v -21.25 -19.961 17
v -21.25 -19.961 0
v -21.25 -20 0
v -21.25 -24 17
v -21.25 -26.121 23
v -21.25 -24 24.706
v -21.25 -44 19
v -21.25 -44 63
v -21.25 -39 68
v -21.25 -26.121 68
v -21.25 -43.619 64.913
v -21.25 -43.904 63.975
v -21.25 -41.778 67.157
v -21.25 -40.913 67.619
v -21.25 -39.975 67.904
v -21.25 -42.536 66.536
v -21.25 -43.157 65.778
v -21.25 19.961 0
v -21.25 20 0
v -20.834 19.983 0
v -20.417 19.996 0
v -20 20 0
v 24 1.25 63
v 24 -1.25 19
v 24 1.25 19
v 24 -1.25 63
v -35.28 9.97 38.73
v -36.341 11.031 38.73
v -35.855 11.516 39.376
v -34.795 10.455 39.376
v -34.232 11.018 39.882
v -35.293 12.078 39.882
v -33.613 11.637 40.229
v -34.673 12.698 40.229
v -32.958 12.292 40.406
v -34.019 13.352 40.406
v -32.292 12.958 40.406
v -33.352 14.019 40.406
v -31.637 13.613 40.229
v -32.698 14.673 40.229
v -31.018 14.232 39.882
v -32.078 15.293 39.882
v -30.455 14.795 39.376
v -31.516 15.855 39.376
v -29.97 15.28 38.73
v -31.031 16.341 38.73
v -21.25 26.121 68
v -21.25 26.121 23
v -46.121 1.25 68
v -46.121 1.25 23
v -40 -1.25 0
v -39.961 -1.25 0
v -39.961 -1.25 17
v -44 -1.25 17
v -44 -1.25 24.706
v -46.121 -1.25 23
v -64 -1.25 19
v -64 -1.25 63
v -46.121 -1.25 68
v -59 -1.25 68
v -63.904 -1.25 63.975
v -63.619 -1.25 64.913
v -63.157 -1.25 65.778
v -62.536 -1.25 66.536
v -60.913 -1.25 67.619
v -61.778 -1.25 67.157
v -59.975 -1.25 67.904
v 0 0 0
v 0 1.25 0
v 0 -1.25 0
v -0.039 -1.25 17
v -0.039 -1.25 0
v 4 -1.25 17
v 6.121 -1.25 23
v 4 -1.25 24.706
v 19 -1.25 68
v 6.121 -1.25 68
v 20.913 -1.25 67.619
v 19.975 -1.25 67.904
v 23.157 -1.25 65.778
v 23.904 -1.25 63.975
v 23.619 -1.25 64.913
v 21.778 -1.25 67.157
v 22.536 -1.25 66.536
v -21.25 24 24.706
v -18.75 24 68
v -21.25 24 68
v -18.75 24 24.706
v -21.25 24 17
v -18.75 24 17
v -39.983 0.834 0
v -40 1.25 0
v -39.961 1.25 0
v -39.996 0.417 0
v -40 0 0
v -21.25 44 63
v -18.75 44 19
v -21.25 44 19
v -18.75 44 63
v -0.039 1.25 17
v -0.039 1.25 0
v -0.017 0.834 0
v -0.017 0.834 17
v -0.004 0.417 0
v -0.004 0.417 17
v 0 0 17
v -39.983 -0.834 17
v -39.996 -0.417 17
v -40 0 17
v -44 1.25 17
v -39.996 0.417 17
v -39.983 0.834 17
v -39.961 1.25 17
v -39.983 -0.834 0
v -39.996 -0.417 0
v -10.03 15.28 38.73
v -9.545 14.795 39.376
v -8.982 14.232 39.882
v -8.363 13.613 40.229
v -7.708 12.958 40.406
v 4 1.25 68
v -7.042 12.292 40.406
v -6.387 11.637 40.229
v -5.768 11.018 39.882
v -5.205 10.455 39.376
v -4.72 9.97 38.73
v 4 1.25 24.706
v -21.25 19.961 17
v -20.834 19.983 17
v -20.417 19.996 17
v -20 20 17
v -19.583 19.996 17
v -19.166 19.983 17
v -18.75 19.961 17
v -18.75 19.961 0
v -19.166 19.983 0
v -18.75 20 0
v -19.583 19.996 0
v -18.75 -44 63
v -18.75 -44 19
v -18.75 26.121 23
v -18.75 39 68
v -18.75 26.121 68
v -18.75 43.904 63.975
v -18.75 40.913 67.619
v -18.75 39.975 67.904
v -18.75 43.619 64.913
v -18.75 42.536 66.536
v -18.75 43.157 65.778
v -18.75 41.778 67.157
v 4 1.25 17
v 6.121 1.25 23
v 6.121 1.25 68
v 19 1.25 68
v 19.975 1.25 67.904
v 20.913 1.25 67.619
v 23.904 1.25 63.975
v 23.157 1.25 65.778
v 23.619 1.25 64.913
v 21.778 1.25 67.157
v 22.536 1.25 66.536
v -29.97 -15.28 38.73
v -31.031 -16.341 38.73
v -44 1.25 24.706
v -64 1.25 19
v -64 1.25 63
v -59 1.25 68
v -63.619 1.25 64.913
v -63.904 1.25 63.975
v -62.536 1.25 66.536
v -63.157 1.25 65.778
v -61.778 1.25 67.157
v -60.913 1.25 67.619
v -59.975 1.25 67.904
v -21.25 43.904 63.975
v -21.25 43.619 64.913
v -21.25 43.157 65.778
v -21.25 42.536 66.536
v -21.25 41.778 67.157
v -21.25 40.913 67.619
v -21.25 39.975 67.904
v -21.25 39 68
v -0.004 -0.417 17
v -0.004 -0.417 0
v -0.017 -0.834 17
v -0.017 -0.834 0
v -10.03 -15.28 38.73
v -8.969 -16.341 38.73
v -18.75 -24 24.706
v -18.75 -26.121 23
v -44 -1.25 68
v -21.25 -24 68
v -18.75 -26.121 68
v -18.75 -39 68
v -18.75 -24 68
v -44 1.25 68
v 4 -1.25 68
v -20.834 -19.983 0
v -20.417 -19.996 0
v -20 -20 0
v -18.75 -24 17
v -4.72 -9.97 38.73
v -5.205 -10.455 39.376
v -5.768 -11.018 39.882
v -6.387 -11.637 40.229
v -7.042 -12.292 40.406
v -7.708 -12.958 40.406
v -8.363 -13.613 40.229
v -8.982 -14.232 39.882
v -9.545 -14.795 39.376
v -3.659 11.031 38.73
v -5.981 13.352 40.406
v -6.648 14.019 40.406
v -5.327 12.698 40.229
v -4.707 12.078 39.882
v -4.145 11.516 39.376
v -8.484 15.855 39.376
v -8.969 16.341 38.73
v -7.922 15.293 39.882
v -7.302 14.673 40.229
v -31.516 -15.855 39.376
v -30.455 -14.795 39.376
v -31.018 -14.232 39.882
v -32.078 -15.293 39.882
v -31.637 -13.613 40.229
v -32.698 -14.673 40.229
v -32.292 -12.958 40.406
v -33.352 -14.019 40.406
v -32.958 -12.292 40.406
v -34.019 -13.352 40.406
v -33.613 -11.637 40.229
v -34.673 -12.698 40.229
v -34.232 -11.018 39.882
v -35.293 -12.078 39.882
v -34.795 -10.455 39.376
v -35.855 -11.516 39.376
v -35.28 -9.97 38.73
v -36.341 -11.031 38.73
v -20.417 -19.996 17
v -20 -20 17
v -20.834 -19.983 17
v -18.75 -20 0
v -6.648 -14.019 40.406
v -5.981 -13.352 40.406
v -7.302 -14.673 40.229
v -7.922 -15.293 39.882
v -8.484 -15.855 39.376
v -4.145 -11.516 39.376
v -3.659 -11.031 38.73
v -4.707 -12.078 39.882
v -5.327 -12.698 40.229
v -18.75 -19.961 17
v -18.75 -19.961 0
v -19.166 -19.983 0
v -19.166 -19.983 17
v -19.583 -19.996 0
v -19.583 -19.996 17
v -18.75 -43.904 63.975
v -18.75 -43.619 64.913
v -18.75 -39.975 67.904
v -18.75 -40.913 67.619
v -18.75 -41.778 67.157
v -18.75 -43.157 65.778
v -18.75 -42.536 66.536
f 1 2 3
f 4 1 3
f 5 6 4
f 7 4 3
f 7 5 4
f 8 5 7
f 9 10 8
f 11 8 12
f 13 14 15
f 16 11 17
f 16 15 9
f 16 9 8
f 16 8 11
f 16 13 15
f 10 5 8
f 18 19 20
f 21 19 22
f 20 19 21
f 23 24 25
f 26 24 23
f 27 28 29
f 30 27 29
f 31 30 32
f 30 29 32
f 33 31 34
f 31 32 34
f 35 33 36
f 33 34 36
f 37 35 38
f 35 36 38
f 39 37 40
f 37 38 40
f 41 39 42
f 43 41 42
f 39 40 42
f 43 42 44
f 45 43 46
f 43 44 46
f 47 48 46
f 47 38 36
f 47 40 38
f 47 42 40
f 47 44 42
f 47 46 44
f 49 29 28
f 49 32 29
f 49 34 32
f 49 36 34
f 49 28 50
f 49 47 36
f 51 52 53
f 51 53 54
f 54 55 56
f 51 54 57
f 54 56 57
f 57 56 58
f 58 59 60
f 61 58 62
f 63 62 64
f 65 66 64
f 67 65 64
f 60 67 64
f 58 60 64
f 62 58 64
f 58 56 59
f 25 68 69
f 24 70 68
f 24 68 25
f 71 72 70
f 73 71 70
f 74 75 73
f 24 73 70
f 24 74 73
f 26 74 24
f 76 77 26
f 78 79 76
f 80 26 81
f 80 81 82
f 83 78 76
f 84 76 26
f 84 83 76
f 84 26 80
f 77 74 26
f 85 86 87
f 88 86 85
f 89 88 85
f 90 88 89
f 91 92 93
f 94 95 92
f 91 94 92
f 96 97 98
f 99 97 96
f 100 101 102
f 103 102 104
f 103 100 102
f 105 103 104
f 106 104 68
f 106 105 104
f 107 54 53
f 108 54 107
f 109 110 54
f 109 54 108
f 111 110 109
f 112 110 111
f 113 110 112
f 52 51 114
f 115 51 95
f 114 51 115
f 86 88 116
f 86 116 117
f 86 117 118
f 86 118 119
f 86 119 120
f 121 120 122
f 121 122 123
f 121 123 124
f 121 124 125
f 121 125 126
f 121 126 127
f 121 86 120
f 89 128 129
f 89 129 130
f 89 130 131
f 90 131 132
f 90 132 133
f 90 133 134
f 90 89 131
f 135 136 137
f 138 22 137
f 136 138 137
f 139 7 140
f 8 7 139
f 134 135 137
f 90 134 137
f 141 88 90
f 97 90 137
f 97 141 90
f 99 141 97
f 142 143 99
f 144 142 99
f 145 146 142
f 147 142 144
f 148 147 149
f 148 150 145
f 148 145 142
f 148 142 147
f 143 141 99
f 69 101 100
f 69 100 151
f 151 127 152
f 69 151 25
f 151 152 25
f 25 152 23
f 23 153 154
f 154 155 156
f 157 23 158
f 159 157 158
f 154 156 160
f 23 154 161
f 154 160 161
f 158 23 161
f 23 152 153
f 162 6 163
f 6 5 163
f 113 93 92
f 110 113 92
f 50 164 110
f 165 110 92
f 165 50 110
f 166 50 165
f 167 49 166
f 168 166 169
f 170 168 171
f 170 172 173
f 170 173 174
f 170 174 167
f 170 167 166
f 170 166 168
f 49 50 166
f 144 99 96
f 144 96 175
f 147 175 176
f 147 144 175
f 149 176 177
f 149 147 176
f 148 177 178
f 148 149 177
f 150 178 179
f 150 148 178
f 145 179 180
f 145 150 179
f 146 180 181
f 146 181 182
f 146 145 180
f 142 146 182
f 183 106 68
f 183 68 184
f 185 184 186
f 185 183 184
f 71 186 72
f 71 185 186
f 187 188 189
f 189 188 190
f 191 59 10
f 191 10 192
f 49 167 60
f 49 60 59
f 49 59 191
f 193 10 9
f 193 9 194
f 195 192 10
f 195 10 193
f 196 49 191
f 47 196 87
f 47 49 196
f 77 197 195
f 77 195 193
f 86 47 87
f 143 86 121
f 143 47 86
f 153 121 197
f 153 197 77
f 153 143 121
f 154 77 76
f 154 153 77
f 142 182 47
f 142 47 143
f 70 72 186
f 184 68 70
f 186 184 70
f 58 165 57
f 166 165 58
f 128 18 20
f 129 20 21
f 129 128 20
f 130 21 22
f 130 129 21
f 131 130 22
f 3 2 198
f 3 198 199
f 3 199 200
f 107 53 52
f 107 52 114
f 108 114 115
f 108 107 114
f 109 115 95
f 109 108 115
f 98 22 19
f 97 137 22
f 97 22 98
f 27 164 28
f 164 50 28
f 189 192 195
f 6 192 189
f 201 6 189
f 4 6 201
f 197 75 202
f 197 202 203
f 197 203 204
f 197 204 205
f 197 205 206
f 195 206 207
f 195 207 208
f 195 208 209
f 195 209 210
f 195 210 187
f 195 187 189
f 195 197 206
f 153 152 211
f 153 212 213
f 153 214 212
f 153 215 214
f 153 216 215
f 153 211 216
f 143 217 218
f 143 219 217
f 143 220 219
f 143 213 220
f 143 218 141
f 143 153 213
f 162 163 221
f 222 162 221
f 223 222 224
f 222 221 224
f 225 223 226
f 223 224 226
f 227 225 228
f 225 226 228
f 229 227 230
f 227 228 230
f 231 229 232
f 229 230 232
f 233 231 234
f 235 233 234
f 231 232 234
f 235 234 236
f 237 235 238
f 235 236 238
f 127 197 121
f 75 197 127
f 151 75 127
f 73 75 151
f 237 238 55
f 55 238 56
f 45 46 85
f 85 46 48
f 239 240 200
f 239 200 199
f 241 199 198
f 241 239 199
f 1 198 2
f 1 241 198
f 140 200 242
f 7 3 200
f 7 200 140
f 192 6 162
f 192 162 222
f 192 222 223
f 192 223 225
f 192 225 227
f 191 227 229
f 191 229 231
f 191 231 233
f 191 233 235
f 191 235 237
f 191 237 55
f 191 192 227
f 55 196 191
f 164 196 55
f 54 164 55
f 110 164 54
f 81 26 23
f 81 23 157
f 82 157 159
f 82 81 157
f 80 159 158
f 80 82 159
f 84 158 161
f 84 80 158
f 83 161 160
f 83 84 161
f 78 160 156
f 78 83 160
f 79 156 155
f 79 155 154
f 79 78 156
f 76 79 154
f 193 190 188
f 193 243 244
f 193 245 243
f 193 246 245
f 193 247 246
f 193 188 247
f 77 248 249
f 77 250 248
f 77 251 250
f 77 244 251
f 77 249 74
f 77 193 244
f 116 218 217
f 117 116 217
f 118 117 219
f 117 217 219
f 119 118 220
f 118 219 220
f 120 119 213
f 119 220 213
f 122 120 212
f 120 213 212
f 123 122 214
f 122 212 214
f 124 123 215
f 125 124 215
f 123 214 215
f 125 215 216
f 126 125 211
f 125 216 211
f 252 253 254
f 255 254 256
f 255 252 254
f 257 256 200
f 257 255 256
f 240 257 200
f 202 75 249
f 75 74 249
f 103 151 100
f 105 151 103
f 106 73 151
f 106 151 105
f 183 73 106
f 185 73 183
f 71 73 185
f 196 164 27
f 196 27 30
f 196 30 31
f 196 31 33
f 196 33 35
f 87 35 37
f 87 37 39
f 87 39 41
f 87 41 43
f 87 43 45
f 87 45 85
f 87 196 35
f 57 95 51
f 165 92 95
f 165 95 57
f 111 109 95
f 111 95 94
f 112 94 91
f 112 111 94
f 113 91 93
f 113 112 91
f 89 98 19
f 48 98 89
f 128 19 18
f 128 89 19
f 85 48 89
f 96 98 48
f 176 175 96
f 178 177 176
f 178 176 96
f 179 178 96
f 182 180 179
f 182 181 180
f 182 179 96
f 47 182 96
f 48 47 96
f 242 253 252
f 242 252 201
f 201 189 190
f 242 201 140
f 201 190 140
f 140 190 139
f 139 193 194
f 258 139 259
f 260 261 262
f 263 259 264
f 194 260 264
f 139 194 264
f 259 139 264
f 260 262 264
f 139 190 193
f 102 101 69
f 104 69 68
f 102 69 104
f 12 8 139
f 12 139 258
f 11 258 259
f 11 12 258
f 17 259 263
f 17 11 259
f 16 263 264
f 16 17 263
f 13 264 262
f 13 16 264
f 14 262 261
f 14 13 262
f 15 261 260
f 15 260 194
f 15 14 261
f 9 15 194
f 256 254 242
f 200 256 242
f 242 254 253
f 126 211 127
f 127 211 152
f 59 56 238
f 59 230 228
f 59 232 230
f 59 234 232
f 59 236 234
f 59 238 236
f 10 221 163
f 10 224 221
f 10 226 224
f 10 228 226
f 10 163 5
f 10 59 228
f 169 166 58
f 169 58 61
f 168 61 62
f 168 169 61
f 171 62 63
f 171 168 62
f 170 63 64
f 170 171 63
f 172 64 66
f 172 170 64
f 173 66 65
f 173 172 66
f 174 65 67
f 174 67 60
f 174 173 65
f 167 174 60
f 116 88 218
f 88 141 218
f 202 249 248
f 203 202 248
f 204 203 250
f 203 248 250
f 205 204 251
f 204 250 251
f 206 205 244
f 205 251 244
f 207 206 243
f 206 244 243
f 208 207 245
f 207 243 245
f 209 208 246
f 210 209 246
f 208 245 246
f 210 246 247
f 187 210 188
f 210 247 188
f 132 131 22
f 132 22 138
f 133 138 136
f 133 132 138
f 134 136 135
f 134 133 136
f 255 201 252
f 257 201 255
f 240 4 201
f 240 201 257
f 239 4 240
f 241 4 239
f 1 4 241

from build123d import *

# Parameters (mm, degrees)
F1_DEPTH  = 1.25
F3_COUNT  = 4
F6_DEPTH  = 45
F8_DEPTH  = 5
F9_COUNT  = 4
F11_DEPTH = 17


with BuildPart() as f1:
    # F0 (on Front) → F1 (new body, symmetric)
    with BuildSketch(Plane.XZ):
        with BuildLine():
            Line((0, 17), (0, 0))
            Line((0, 0), (24, 19))
            Line((24, 19), (24, 63))
            ThreePointArc((24, 63), (22.5355339059, 66.5355339059), (19, 68))
            Line((19, 68), (4, 68))
            Line((4, 68), (4, 17))
            Line((4, 17), (0, 17))
        make_face()
    extrude(amount=F1_DEPTH, both=True)


with BuildPart() as f3_1:
    # F3: instance of F1
    add(f1.part.rotate(Axis((-20, 0, 4.0539303016), (0, 0, 1)), 1 * 360 / F3_COUNT))


with BuildPart() as f3_2:
    # F3: instance of F1
    add(f1.part.rotate(Axis((-20, 0, 4.0539303016), (0, 0, 1)), 2 * 360 / F3_COUNT))


with BuildPart() as f3_3:
    # F3: instance of F1
    add(f1.part.rotate(Axis((-20, 0, 4.0539303016), (0, 0, 1)), 3 * 360 / F3_COUNT))


with BuildPart() as f6:
    # F5 (on face) → F6 (new body)
    with BuildSketch(Plane.XY.offset(68)):
        Polygon((-18.75, 26.1213203436), (-18.75, 24), (4, 1.25), (6.1213203436, 1.25), align=None)
    extrude(amount=-F6_DEPTH)

    # F7 (on face) → F8 (cut)
    with BuildSketch(Plane(origin=(3.6856601718, 3.6856601718, 0), x_dir=(-0.7071067812, 0.7071067812, 0), z_dir=(0.7071067812, 0.7071067812, 0))):
        with BuildLine():
            Line((31.7288148957, 23), (17.8969432153, 38.7299413567))
            ThreePointArc((17.8969432153, 38.7299413567), (14.1421356237, 40.4282115146), (10.3873280321, 38.7299413567))
            Line((10.3873280321, 38.7299413567), (-3.4445436483, 23))
            Line((-3.4445436483, 23), (31.7288148957, 23))
        make_face()
    extrude(amount=-F8_DEPTH, mode=Mode.SUBTRACT)


with BuildPart() as f1_1:
    add(f1.part)

    add(f3_1.part)  # F9 merges F3_1

    add(f3_2.part)  # F9 merges F3_2

    add(f3_3.part)  # F9 merges F3_3
    # F9: F6 ×4 about axis
    f9_axis = Axis((-20, 0, 68), (0, 0, 1))
    for i in range(1, F9_COUNT):
        add(f6.part.rotate(f9_axis, i * 360 / F9_COUNT))

    add(f6.part)  # F11 merges F6
    # F10 (on face) → F11 (join)
    with BuildSketch(Plane.XY.offset(17)):
        with BuildLine():
            Line((-18.75, 19.9608992783), (-18.75, 20))
            Line((-18.75, 20), (-19.9999998635, 20))
            ThreePointArc((-19.9999998635, 20), (-19.3746942332, 19.9902224274), (-18.75, 19.9608992783))
        make_face()
        with BuildLine():
            ThreePointArc((-21.25, 19.9608992783), (-20.6253056303, 19.9902224317), (-19.9999998635, 20))
            Line((-19.9999998635, 20), (-21.25, 20))
            Line((-21.25, 20), (-21.25, 19.9608992783))
        make_face()
        with BuildLine():
            Line((-0.0391007217, -1.25), (0, -1.25))
            Line((0, -1.25), (0, 9.88e-08))
            ThreePointArc((0, 9.88e-08), (-0.0097775689, -0.6253056492), (-0.0391007217, -1.25))
        make_face()
        with BuildLine():
            ThreePointArc((-0.0391007217, 1.25), (-0.009777572, 0.6253057479), (0, 9.88e-08))
            Line((0, 9.88e-08), (0, 1.25))
            Line((0, 1.25), (-0.0391007217, 1.25))
        make_face()
        with BuildLine():
            Line((-21.25, -19.9608992783), (-21.25, -20))
            Line((-21.25, -20), (-20.0000001365, -20))
            ThreePointArc((-20.0000001365, -20), (-20.6253057668, -19.9902224274), (-21.25, -19.9608992783))
        make_face()
        with BuildLine():
            ThreePointArc((-18.75, -19.9608992783), (-19.3746943697, -19.9902224317), (-20.0000001365, -20))
            Line((-20.0000001365, -20), (-18.75, -20))
            Line((-18.75, -20), (-18.75, -19.9608992783))
        make_face()
        with BuildLine():
            Line((-39.9608992783, 1.25), (-40, 1.25))
            Line((-40, 1.25), (-40, 0))
            ThreePointArc((-40, 0), (-39.9902224296, 0.6253056985), (-39.9608992783, 1.25))
        make_face()
        with BuildLine():
            ThreePointArc((-39.9608992783, -1.25), (-39.9902224296, -0.6253056985), (-40, 0))
            Line((-40, 0), (-40, -1.25))
            Line((-40, -1.25), (-39.9608992783, -1.25))
        make_face()
    extrude(amount=-F11_DEPTH)


solid = f1_1.part
